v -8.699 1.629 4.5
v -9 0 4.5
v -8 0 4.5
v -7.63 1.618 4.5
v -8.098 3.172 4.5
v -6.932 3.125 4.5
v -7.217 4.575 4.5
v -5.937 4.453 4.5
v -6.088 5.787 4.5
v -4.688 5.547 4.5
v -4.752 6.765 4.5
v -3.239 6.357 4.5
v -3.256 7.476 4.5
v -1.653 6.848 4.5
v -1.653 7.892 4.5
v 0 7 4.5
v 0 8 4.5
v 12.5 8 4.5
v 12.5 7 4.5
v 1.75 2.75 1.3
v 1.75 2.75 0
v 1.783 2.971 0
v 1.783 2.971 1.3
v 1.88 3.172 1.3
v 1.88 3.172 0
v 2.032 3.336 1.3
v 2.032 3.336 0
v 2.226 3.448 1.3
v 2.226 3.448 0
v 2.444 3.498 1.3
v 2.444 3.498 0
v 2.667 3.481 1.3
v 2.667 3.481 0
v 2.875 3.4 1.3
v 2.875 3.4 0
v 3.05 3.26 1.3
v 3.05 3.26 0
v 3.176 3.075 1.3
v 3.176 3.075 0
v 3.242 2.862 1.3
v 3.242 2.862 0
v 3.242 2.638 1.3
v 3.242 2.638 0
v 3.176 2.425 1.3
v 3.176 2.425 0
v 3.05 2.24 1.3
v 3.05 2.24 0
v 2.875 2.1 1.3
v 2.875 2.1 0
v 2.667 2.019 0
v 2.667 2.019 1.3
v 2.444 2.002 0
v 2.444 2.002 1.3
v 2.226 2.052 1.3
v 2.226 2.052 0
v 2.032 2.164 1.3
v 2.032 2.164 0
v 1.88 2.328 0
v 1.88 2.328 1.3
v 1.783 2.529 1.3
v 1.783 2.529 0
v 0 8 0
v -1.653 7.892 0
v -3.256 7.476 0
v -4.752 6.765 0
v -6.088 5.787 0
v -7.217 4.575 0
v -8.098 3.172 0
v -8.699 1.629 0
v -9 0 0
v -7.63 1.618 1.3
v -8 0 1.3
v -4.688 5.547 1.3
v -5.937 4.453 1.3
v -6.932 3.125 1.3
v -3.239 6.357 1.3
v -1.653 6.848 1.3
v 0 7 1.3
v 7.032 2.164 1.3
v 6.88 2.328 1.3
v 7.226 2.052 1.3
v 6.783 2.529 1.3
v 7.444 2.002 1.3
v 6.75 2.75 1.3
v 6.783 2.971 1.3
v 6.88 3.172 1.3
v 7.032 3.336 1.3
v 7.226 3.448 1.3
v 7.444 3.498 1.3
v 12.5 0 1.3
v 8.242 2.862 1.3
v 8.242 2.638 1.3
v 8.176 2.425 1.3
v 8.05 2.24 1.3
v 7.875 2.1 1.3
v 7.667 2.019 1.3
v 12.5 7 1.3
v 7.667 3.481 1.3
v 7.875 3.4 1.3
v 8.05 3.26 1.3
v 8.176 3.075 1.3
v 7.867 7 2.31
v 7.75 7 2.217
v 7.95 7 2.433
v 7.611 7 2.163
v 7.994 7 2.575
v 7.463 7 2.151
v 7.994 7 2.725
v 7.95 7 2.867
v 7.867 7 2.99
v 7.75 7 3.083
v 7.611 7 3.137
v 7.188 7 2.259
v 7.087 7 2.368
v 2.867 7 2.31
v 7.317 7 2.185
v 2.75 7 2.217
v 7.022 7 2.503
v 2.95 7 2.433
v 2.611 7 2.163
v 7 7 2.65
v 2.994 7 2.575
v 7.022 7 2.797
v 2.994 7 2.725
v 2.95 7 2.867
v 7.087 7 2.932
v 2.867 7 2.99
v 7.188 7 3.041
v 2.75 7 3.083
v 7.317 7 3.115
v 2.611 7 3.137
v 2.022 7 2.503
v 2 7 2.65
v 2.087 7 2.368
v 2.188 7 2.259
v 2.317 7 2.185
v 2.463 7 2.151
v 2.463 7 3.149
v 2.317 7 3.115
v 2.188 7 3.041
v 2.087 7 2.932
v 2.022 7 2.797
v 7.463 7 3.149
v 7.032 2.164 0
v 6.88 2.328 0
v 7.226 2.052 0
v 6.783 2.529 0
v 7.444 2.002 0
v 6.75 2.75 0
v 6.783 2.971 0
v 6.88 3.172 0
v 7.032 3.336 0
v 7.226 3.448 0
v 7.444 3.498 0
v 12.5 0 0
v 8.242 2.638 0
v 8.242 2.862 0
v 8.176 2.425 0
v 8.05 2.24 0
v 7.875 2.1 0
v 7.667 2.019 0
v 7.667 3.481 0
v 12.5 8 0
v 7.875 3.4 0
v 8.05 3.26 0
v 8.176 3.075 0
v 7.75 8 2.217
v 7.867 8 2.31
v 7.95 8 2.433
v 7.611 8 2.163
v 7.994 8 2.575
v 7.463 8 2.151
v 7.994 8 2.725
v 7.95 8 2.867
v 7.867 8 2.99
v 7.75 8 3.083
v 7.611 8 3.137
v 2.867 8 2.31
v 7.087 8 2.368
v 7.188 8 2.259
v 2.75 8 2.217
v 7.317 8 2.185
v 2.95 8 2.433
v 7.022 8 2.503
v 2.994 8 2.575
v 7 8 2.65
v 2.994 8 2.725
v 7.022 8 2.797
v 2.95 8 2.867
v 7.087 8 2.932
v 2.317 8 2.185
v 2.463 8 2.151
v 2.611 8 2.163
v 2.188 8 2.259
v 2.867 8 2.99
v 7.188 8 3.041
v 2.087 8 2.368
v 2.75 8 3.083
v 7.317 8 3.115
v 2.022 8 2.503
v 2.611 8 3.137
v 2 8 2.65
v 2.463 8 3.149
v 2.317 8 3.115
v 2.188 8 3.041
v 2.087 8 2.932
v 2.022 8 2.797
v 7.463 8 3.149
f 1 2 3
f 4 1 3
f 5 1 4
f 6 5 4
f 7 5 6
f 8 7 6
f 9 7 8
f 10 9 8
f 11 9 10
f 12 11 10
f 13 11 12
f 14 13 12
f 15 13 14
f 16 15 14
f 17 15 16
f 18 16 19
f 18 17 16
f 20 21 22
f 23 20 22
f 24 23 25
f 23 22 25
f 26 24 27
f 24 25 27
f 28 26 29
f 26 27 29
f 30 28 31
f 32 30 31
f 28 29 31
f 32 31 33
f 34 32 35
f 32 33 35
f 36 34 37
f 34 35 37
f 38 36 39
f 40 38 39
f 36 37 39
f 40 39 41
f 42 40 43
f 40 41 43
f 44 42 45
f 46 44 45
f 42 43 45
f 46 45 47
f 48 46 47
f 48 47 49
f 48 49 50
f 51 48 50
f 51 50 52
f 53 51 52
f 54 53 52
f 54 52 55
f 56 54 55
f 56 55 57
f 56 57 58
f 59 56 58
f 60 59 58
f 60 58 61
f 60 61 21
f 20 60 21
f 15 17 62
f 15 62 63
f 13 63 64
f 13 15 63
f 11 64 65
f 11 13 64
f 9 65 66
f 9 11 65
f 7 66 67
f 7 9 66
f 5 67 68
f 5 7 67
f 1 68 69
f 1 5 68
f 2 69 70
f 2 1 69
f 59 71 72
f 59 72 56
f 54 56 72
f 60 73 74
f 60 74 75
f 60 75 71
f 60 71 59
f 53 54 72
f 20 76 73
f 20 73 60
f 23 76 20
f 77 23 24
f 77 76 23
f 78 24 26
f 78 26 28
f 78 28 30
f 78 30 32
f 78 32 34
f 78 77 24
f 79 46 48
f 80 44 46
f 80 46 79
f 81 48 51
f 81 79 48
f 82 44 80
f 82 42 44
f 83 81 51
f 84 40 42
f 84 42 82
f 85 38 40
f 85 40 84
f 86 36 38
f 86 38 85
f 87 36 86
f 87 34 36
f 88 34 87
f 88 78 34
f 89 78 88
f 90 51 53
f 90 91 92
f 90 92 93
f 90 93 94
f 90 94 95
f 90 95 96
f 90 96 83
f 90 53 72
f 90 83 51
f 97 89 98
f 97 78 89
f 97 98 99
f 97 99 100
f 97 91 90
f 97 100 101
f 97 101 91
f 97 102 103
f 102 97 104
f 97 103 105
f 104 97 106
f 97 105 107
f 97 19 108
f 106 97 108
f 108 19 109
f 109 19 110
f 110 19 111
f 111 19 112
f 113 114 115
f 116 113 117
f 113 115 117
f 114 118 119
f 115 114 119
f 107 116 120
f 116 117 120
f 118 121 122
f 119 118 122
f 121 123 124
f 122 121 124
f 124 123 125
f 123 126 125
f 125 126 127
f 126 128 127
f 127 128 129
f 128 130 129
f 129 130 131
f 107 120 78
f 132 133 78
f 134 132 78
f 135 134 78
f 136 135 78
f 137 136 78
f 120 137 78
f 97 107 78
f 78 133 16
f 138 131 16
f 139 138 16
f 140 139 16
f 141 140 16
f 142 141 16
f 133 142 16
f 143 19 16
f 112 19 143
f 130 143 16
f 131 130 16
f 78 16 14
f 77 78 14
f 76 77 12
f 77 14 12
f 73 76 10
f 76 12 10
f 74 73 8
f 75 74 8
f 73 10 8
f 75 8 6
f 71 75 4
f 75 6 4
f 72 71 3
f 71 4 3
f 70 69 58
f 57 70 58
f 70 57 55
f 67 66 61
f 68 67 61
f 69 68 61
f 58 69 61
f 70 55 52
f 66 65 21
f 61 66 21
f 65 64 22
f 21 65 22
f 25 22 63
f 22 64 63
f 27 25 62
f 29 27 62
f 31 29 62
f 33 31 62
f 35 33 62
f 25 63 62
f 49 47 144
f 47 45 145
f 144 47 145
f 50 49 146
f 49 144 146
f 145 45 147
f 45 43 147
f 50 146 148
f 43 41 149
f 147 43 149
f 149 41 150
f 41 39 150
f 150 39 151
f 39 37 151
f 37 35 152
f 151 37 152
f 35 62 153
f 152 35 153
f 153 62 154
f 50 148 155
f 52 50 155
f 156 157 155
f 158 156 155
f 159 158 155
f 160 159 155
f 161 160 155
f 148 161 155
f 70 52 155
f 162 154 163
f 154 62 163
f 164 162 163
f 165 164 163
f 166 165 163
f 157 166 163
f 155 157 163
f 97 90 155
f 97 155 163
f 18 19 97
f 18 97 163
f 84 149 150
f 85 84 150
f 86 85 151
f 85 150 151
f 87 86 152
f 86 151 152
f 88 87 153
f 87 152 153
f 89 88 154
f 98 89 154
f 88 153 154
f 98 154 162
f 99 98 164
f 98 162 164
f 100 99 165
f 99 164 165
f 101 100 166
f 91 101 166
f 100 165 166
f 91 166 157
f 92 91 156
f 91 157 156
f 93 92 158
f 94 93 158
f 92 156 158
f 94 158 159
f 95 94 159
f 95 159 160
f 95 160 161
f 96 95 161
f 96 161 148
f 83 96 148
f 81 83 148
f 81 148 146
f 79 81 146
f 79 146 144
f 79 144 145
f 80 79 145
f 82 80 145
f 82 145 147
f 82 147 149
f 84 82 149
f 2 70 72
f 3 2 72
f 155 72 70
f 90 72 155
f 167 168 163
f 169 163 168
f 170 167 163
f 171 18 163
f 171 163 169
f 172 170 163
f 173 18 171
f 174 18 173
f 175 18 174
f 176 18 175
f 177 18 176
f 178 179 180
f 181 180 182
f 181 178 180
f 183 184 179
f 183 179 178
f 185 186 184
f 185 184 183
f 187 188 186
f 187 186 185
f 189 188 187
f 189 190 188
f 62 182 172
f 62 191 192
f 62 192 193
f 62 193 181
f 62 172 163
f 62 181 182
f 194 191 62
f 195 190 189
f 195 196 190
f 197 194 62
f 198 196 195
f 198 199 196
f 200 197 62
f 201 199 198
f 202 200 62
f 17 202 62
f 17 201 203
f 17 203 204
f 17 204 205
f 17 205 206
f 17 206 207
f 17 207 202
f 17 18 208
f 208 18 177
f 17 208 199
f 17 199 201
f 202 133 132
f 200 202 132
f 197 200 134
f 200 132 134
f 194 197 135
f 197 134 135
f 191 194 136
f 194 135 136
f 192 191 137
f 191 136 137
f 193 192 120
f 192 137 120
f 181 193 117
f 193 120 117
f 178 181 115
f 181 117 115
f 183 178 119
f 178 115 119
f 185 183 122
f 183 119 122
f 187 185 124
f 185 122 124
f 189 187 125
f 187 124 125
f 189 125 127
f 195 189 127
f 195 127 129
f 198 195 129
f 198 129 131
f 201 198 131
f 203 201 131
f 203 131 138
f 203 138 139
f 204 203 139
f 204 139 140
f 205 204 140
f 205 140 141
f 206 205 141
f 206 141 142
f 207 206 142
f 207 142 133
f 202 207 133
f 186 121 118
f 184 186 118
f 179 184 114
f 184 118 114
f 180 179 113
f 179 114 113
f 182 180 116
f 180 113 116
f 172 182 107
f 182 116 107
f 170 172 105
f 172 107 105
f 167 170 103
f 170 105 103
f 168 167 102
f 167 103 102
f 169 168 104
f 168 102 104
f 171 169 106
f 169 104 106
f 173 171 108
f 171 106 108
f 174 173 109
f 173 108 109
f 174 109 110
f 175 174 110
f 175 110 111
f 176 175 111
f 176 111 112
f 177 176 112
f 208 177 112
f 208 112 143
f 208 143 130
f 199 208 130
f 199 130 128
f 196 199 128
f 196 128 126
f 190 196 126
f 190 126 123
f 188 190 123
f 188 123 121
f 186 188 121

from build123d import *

# Parameters (mm, degrees)
SALIENTE_EXTRUIR1_DEPTH           = 4.5
CORTAR_EXTRUIR1_DEPTH             = 3.2
DI_METRO_DE_TALADRO_1_0_1_1_D     = 1
DI_METRO_DE_TALADRO_1_0_1_1_DEPTH = 8
DI_METRO_DE_TALADRO_1_5_1_5_1_D   = 1.5


with BuildPart() as part:
    # Croquis1 → Saliente-Extruir1 (new body)
    with BuildSketch(Plane.XY.offset(4.5)):
        with BuildLine():
            Line((-9, 0), (12.5, 0))
            Line((12.5, 0), (12.5, 8))
            Line((12.5, 8), (0, 8))
            ThreePointArc((0, 8), (-6.088245682, 5.786776392), (-9, 0))
        make_face()
    extrude(amount=-SALIENTE_EXTRUIR1_DEPTH)

    # Croquis2 → Cortar-Extruir1 (cut)
    with BuildSketch(Plane.XY.offset(4.5)):
        with BuildLine():
            Line((12.5, 7), (0, 7))
            ThreePointArc((0, 7), (-5.341079038, 5.032661758), (-8, 0))
            Line((-8, 0), (12.5, 0))
            Line((12.5, 0), (12.5, 7))
        make_face()
    extrude(amount=-CORTAR_EXTRUIR1_DEPTH, mode=Mode.SUBTRACT)

    # Diámetro de taladro Ø1.0 (1)1
    with Locations(Plane(origin=(0, 8, 0), x_dir=(1, 0, 0), z_dir=(0, 1, 0))):
        with Locations((2.5, -2.65), (7.5, -2.65)):
            Hole(DI_METRO_DE_TALADRO_1_0_1_1_D / 2, depth=DI_METRO_DE_TALADRO_1_0_1_1_DEPTH)

    # Diámetro de taladro Ø1.5 (1.5)1 (through all)
    with Locations(Plane.XY.offset(1.3)):
        with Locations((7.5, 2.75), (2.5, 2.75)):
            Hole(DI_METRO_DE_TALADRO_1_5_1_5_1_D / 2)


solid = part.part
